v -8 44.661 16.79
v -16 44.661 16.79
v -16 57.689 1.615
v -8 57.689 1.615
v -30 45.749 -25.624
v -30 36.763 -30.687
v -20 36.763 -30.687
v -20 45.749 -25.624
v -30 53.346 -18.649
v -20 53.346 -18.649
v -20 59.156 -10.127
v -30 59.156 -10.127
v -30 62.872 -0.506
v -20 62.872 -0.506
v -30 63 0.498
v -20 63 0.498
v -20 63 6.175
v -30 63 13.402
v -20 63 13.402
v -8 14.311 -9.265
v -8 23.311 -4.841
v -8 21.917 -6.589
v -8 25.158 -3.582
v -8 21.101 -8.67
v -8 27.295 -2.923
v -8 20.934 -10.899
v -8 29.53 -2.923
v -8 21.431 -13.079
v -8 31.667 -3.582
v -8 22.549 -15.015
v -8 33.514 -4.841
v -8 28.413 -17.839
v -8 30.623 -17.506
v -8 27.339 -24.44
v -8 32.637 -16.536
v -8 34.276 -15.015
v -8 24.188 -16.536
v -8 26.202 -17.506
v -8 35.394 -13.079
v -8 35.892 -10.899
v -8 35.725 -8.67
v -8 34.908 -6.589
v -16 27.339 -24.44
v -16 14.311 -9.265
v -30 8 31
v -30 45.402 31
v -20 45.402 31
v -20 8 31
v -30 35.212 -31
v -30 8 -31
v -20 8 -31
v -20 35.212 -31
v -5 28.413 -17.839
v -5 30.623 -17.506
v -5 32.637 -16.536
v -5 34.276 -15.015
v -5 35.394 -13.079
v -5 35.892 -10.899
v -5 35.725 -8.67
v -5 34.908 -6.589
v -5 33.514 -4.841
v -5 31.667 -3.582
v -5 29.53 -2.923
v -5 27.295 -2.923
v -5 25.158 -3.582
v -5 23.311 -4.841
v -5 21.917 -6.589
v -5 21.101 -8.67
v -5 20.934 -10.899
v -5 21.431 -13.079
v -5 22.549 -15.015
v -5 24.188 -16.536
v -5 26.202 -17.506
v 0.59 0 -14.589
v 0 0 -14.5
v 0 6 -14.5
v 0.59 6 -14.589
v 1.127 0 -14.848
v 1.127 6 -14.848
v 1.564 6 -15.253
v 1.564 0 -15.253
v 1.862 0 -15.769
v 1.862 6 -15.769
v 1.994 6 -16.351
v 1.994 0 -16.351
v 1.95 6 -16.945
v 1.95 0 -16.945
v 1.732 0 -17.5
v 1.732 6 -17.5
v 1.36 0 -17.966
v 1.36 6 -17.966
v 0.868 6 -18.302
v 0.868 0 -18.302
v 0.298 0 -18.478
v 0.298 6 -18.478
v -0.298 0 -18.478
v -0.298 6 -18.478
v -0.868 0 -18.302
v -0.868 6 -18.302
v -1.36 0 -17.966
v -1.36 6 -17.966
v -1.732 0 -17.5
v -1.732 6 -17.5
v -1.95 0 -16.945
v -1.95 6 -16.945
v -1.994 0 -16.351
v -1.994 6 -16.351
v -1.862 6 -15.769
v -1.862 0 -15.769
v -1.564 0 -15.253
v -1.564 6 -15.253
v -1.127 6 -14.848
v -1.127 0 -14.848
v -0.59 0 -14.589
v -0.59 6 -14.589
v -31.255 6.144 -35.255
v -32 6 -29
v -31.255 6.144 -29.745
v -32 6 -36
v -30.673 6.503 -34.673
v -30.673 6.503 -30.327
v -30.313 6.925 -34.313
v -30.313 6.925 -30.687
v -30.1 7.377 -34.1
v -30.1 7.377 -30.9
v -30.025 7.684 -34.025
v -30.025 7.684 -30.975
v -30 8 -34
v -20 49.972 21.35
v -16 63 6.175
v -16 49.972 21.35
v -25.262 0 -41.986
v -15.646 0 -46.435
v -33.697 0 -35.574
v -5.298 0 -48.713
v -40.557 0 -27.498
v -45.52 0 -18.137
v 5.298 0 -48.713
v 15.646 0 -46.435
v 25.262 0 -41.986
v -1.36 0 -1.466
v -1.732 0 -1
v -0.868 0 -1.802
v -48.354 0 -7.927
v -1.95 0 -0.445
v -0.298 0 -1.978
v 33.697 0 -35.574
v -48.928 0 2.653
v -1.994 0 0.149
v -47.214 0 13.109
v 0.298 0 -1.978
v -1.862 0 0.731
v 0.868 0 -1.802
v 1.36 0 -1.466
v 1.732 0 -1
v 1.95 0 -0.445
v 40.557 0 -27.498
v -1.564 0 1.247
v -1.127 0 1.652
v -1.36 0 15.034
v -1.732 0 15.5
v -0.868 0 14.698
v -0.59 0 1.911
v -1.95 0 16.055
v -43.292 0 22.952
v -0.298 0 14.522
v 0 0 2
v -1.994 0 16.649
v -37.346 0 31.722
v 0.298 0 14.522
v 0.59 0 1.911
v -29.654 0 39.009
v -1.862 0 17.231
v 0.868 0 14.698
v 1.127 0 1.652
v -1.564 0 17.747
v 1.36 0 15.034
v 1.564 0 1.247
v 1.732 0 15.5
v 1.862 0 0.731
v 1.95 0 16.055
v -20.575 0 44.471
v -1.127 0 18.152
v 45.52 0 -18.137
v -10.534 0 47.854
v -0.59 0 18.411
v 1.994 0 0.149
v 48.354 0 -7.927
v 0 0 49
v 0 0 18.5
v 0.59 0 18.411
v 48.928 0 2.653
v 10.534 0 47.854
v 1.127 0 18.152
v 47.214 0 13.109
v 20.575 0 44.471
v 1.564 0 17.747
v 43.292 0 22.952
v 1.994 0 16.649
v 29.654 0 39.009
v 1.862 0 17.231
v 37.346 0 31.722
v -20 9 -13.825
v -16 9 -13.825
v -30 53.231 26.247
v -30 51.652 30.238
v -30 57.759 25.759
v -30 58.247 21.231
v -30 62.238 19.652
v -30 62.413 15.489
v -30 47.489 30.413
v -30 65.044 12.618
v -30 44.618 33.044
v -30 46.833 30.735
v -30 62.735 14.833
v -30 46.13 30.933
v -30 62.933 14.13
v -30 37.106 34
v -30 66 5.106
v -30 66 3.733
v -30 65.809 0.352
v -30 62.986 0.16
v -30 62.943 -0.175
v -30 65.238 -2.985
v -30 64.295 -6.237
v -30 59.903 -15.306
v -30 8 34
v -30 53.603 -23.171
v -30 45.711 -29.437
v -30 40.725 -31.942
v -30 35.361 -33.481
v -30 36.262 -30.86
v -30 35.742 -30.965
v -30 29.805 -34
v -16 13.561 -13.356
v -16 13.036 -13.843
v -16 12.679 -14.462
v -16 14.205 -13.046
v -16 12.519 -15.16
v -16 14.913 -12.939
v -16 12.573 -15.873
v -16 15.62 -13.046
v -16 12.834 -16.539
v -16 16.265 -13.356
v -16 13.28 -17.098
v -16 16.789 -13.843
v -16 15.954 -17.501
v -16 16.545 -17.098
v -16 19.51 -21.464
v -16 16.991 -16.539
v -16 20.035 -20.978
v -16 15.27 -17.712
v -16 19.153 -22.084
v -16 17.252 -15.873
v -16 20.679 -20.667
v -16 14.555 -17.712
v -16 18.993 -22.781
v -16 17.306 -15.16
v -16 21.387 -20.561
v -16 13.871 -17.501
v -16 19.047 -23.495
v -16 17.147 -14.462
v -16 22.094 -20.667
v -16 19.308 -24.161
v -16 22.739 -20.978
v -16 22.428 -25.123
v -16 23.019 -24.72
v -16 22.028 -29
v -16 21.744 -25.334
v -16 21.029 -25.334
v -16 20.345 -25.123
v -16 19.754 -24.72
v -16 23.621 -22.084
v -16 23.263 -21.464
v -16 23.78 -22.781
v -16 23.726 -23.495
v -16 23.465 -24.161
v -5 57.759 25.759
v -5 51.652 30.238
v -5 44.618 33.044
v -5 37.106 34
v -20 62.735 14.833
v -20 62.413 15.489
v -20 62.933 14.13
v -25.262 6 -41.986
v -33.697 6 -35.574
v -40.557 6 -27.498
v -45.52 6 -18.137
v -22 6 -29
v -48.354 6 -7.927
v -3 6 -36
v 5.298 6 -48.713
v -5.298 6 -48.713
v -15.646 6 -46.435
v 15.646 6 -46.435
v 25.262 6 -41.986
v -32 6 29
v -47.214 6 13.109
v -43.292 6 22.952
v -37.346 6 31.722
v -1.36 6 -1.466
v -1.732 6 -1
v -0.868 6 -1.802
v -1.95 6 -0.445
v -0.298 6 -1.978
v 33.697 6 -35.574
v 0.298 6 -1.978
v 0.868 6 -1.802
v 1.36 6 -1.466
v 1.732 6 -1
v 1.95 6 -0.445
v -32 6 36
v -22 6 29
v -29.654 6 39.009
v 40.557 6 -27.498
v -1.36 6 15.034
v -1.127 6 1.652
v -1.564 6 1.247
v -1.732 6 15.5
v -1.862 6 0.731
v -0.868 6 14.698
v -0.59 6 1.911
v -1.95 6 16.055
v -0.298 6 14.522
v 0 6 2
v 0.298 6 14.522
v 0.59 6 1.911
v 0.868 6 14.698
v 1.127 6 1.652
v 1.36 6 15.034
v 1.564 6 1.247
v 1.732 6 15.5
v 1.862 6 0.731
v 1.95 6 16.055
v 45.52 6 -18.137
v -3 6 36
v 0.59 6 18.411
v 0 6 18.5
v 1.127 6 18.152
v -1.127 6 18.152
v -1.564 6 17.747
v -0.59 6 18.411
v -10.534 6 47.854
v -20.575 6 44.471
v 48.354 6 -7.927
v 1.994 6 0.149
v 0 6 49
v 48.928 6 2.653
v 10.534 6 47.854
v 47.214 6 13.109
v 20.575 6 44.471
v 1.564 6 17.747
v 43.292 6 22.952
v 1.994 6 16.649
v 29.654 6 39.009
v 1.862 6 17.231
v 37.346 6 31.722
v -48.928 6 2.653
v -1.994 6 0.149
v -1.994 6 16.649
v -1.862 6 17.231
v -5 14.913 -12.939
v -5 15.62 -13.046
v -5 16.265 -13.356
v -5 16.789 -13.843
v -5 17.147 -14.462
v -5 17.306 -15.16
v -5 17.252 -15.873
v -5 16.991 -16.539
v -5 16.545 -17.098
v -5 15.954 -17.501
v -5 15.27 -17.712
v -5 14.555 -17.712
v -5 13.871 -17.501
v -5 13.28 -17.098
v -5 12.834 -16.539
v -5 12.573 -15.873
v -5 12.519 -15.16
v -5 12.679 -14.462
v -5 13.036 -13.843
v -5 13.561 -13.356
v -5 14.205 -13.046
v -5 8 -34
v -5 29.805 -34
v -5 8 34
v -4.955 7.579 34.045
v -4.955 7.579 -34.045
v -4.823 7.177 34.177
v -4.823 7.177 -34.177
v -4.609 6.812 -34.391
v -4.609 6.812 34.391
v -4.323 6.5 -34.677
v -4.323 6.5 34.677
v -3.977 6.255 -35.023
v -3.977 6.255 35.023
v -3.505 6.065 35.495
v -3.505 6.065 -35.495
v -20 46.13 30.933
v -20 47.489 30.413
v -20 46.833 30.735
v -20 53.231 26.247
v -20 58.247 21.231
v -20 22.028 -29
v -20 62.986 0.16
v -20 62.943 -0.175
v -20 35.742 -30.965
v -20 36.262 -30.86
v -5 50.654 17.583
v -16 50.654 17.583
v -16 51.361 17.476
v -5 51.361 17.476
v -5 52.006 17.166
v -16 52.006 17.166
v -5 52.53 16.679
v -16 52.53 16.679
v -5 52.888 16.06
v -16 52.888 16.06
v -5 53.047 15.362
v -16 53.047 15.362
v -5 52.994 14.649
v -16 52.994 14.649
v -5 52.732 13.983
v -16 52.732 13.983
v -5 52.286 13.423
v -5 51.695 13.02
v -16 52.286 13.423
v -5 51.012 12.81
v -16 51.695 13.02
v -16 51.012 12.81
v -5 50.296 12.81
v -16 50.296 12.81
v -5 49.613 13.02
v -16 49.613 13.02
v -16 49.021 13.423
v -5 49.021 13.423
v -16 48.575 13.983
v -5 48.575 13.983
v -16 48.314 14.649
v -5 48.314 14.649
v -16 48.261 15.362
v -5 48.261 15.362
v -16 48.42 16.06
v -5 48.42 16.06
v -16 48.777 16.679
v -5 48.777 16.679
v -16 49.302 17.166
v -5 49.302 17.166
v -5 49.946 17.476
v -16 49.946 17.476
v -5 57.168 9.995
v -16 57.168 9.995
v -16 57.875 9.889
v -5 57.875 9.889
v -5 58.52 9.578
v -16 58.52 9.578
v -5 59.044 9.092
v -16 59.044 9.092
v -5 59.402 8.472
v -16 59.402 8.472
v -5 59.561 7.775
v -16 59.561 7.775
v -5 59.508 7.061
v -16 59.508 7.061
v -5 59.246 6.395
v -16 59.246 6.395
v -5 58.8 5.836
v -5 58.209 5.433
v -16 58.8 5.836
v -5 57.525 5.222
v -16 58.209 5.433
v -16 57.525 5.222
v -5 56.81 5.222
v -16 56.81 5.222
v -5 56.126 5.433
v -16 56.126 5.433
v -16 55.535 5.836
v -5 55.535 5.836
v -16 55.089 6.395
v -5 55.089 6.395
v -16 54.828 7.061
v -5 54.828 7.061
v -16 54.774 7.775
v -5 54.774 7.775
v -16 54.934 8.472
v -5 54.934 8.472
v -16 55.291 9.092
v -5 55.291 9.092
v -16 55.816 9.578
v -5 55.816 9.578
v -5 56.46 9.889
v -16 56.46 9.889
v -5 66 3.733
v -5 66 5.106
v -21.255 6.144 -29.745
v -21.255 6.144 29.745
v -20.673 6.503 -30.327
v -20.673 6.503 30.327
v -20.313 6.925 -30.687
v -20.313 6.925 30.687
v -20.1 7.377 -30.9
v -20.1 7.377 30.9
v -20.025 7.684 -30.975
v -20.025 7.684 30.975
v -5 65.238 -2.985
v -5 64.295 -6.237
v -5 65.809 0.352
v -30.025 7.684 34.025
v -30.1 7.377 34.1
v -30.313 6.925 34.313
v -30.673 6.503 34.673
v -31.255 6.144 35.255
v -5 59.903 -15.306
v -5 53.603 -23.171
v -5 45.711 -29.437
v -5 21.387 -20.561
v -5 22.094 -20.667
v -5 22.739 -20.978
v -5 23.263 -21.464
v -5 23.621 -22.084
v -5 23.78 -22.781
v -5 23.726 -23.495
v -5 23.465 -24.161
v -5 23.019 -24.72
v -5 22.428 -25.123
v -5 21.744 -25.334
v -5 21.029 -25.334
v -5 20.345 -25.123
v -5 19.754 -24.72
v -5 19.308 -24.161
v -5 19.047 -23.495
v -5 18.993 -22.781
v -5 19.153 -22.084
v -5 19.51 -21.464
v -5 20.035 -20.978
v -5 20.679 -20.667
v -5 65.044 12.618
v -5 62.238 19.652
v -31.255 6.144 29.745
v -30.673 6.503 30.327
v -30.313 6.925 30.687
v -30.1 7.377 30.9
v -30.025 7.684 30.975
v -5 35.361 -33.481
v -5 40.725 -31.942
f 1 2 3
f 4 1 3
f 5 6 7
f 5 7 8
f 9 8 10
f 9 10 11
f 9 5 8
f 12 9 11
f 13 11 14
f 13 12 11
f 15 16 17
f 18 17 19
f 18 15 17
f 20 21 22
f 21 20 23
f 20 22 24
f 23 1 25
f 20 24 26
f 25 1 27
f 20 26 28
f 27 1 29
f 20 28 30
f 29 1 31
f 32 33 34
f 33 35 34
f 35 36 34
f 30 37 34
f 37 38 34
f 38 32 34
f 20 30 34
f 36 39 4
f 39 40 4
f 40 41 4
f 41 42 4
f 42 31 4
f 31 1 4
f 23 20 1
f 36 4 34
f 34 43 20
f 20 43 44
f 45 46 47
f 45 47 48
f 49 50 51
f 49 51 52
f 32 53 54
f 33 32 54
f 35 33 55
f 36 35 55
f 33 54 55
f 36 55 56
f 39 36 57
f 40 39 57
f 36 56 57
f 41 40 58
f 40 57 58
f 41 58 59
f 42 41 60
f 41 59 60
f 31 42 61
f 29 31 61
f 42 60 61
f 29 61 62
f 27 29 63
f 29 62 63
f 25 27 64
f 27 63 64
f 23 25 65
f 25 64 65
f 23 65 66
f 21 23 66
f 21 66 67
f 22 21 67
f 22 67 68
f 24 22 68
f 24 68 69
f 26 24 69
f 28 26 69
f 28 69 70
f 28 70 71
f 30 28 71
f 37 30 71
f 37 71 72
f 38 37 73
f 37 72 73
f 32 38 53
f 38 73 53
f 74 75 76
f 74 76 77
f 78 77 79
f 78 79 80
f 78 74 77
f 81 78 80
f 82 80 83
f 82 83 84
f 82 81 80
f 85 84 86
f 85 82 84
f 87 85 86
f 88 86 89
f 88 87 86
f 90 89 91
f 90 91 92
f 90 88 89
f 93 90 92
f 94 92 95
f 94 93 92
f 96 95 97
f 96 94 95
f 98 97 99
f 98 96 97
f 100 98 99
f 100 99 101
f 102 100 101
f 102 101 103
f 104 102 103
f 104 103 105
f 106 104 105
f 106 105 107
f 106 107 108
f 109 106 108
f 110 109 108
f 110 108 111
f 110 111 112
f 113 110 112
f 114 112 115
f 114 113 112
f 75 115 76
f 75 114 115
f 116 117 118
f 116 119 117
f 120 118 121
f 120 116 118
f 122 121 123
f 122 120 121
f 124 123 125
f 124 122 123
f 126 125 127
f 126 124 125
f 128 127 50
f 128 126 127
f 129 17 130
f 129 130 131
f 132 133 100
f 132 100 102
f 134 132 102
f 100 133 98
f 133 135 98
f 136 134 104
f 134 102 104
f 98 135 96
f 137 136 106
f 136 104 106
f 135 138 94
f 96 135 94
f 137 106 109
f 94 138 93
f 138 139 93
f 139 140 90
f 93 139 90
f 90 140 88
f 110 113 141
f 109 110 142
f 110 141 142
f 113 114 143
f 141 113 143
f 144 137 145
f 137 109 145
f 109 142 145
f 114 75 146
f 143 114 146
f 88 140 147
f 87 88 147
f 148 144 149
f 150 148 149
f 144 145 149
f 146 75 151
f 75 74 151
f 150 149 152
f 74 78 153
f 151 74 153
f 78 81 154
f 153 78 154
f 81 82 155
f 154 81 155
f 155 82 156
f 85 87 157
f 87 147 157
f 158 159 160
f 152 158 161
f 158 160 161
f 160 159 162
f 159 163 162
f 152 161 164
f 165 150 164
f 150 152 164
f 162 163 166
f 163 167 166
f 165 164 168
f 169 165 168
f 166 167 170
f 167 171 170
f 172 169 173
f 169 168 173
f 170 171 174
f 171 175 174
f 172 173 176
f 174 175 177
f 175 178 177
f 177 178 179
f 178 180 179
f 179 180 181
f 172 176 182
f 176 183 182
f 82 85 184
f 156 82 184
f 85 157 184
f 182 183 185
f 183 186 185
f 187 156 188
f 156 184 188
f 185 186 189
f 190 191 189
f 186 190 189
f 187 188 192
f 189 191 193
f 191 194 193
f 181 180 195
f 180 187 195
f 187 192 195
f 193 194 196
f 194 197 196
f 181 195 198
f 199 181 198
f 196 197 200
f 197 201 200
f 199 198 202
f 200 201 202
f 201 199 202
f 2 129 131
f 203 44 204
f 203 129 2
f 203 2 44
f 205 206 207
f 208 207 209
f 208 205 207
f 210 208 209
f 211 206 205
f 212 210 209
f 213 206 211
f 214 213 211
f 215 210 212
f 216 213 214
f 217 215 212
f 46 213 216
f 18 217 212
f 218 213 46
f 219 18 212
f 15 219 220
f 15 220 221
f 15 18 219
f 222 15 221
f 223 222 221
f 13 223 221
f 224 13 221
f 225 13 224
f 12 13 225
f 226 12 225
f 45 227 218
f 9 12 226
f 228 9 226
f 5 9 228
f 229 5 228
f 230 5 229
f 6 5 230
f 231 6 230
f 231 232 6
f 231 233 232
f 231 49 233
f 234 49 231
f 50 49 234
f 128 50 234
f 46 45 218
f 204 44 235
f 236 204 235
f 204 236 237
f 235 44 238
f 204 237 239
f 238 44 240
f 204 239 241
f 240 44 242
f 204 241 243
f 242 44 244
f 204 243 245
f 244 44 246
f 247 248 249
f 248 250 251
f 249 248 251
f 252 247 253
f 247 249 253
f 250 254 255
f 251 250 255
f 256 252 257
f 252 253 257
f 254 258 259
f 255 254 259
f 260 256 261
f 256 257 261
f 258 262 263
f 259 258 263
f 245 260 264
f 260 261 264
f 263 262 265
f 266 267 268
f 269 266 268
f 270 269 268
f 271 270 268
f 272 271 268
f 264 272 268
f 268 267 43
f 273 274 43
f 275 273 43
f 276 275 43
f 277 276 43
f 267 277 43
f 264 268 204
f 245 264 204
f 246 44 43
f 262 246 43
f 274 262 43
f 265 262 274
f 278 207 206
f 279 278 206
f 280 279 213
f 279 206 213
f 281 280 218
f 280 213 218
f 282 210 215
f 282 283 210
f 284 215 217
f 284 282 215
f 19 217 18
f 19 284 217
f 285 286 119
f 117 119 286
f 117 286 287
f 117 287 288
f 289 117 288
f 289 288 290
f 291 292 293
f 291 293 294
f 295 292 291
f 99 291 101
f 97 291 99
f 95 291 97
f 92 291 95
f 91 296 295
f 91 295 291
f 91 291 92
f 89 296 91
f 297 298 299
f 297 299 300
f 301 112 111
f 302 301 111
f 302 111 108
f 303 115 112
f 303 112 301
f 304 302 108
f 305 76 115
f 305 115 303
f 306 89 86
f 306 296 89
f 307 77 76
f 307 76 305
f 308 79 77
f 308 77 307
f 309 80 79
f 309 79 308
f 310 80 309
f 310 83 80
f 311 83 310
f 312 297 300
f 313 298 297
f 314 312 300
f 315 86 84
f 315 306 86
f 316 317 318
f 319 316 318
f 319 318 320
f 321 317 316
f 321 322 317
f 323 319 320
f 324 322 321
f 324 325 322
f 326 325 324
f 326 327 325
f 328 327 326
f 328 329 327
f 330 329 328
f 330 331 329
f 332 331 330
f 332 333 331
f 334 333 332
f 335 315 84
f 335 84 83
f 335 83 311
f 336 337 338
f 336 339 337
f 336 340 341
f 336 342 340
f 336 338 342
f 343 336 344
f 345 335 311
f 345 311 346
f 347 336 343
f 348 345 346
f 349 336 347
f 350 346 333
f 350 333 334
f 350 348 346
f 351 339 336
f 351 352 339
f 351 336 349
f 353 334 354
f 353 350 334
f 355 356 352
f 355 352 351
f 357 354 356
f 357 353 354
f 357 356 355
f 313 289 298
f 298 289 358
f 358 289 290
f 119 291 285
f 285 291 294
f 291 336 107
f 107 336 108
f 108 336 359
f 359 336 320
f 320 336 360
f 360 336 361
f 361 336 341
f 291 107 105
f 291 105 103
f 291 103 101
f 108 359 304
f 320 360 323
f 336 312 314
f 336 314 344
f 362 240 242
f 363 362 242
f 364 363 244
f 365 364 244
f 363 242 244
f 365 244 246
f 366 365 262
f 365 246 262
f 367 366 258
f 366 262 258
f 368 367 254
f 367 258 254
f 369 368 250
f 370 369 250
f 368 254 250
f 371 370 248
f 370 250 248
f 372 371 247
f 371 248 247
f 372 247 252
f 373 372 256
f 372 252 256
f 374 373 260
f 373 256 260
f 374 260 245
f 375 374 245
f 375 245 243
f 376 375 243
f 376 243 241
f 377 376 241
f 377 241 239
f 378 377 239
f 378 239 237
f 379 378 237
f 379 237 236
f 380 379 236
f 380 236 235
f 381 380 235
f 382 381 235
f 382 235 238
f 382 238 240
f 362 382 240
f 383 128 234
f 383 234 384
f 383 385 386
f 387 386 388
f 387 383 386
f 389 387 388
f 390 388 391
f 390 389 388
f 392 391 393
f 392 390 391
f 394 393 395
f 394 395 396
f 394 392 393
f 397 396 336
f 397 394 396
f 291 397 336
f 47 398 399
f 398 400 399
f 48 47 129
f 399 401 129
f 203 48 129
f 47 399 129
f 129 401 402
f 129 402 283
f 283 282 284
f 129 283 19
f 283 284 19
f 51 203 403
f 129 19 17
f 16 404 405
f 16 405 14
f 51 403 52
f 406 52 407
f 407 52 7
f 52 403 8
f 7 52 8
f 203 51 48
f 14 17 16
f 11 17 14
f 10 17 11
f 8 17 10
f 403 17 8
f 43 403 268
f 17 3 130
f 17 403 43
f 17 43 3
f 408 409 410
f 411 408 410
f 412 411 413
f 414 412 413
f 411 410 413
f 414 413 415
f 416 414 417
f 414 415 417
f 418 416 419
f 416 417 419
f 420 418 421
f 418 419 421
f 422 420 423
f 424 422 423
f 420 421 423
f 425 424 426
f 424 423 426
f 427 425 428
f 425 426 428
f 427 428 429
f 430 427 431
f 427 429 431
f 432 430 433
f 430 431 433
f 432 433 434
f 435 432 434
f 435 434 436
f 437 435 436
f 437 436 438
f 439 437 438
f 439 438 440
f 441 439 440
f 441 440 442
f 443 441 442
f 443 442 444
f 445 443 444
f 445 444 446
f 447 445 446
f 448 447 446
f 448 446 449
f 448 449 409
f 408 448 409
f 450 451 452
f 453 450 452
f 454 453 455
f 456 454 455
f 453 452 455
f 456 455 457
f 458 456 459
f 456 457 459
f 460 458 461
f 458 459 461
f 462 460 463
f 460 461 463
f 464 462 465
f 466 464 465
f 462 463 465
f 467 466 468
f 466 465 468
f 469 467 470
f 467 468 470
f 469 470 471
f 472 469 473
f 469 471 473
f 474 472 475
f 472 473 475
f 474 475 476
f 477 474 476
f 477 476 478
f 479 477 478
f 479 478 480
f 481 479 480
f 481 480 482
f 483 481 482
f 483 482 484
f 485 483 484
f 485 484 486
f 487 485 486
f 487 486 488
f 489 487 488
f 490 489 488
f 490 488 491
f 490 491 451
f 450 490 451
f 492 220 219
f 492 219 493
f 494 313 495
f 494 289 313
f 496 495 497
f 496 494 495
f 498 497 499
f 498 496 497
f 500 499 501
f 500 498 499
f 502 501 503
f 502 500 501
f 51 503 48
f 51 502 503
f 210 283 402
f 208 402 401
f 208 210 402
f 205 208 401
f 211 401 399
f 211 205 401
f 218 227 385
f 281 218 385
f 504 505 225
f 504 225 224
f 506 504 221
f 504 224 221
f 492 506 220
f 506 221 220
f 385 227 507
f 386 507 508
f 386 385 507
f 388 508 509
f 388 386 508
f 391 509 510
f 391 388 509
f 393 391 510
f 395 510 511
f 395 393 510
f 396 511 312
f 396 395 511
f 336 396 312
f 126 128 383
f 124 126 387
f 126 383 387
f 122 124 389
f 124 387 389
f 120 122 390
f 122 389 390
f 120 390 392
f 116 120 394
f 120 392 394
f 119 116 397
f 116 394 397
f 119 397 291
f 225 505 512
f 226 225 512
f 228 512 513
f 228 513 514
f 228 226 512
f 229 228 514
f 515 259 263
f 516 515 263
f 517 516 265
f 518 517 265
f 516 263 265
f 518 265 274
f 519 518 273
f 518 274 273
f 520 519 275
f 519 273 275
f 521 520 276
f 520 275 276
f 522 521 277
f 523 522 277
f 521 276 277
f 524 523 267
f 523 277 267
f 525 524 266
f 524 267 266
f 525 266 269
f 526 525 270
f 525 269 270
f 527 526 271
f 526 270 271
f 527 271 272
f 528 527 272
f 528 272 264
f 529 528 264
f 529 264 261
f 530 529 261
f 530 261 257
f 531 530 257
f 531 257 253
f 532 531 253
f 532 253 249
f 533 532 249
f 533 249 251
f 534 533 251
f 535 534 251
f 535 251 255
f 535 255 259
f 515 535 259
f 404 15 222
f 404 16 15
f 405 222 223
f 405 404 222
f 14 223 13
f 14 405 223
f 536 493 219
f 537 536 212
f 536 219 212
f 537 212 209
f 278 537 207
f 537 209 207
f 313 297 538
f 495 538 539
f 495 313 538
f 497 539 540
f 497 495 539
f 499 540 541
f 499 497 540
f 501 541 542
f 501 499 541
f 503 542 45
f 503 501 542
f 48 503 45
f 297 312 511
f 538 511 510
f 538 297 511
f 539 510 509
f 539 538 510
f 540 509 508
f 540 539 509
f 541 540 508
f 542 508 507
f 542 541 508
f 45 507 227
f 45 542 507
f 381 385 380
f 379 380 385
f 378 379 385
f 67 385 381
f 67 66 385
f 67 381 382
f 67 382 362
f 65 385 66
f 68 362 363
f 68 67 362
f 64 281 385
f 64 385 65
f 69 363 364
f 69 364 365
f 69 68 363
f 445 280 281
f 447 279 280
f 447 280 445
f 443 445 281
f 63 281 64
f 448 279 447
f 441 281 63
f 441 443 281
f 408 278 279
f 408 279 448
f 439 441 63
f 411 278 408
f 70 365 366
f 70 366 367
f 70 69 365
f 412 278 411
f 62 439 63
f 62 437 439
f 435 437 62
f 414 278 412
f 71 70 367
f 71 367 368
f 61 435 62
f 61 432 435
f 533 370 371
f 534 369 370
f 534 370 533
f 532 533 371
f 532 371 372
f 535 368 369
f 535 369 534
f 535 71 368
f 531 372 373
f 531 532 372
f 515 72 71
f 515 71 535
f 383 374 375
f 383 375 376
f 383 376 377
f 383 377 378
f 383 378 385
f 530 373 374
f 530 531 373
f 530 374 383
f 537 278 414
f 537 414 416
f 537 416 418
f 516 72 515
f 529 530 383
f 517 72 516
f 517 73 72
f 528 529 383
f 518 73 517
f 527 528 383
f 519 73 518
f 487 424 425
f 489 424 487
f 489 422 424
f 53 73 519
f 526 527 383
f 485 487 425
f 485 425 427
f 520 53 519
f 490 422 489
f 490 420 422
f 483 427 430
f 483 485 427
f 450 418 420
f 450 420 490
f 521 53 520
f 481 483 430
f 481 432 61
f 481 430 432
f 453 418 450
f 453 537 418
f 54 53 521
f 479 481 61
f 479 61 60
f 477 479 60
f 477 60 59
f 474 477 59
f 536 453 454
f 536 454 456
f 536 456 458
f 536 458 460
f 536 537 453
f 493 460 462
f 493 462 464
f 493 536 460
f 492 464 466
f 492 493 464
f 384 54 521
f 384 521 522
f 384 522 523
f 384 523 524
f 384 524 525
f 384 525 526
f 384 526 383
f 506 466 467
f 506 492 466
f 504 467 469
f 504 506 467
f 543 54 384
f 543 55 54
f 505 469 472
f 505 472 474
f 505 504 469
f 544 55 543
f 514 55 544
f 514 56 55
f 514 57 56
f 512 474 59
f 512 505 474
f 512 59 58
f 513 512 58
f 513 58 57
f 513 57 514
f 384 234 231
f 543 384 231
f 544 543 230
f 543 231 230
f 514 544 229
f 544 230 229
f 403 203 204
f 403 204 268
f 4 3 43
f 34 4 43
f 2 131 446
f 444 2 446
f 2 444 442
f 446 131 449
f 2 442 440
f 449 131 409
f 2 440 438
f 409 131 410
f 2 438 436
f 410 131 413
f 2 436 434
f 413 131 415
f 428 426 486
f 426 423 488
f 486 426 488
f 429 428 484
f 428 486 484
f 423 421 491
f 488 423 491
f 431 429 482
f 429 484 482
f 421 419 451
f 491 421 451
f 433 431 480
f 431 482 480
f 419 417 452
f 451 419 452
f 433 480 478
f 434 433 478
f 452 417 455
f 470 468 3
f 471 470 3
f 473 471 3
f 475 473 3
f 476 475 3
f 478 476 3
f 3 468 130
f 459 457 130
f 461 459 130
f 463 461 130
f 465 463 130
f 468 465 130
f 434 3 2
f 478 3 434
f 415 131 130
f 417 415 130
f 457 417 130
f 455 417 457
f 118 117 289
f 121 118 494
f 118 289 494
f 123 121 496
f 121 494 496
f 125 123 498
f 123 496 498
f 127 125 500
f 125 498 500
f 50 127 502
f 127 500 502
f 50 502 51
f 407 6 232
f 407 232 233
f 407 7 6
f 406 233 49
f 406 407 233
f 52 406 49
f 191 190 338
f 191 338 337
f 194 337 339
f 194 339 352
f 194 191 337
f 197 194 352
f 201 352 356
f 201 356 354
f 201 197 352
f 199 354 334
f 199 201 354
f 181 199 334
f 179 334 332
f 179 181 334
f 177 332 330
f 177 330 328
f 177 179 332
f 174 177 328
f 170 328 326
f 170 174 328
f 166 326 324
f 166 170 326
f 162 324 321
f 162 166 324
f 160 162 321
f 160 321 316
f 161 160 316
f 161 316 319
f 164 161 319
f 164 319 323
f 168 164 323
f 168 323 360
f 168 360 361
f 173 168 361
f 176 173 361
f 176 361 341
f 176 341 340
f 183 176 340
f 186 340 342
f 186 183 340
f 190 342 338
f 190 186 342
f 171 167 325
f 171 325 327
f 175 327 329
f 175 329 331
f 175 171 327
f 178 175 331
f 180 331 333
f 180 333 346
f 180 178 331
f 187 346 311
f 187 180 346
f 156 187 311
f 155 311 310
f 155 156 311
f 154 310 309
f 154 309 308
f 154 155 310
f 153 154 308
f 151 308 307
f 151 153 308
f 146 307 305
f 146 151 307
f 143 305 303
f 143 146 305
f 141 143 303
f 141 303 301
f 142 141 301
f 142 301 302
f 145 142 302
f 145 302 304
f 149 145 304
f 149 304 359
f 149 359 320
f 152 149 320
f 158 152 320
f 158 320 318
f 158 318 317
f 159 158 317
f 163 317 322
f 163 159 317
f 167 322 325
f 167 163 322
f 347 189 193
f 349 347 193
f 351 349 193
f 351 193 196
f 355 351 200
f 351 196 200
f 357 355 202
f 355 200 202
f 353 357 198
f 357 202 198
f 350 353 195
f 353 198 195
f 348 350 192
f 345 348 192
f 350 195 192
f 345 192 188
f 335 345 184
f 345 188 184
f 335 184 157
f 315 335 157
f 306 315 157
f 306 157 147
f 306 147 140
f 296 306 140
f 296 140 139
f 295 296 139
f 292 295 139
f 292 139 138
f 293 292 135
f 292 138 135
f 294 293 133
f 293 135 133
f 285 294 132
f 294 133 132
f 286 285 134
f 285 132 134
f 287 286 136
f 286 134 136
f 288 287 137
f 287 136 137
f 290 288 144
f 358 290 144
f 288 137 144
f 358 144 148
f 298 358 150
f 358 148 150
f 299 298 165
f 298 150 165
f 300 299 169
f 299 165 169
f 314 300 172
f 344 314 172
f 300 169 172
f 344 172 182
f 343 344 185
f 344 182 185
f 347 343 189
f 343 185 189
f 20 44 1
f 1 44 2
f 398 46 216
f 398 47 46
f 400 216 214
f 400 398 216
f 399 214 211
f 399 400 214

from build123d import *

# Parameters (mm, degrees)
SKETCH1_R           = 49
SKETCH1_R_2         = 2
BOSS_EXTRUDE1_DEPTH = 6
SKETCH3_W           = 25
SKETCH3_H           = 68
BOSS_EXTRUDE2_DEPTH = 60
CUT_EXTRUDE1_DEPTH  = 14
SKETCH5_R           = 2.4
CUT_EXTRUDE2_DEPTH  = 20
CUT_EXTRUDE3_DEPTH  = 30
CUT_EXTRUDE5_DEPTH  = 10
SKETCH13_R          = 7.5
BOSS_EXTRUDE3_DEPTH = 3
FILLET2_R           = 30
FILLET3_R           = 2
FILLET4_R           = 4


with BuildPart() as part:
    # Sketch1 → Boss-Extrude1 (new body)
    with BuildSketch(Plane(origin=(0, 0, 0), x_dir=(1, 0, 0), z_dir=(0, 1, 0))):
        with Locations(Location((0, 0, 0), (0, 0, 270))):
            Circle(SKETCH1_R)
        with Locations(Location((0, 16.5, 0), (0, 0, 270))):
            Circle(SKETCH1_R_2, mode=Mode.SUBTRACT)
        with Locations(Location((0, -16.5, 0), (0, 0, 270))):
            Circle(SKETCH1_R_2, mode=Mode.SUBTRACT)
        with Locations(Location((0, 0, 0), (0, 0, 270))):
            Circle(SKETCH1_R_2, mode=Mode.SUBTRACT)
    extrude(amount=BOSS_EXTRUDE1_DEPTH)

    # Sketch3 → Boss-Extrude2 (add)
    with BuildSketch(Plane(origin=(0, 6, 0), x_dir=(1, 0, 0), z_dir=(0, 1, 0))):
        with Locations((-17.5, 0)):
            Rectangle(SKETCH3_W, SKETCH3_H)
    extrude(amount=BOSS_EXTRUDE2_DEPTH)

    # Sketch4 → Cut-Extrude1 (cut)
    with BuildSketch(Plane.ZY.offset(30)):
        Polygon((-13.82509047, 9), (-29, 22.02774427), (6.17490953, 63), (21.349819059, 49.97225573), align=None)
    extrude(amount=-CUT_EXTRUDE1_DEPTH, mode=Mode.SUBTRACT)

    # Sketch5 → Cut-Extrude2 (cut)
    with BuildSketch(Plane.ZY.offset(16)):
        with Locations((-22.960549625, 21.386659614)):
            Circle(SKETCH5_R)
        with Locations((-15.33906677, 14.912634661)):
            Circle(SKETCH5_R)
        with Locations((7.595246131, 57.167755541)):
            Circle(SKETCH5_R)
        with Locations((15.182700896, 50.653883406)):
            Circle(SKETCH5_R)
        Polygon((-24.440289505, 27.338962606), (-9.265379976, 14.311218335), (16.790108565, 44.661037394), (1.615199035, 57.688781665), align=None)
    extrude(amount=-CUT_EXTRUDE2_DEPTH, mode=Mode.SUBTRACT)

    # Sketch8 → Cut-Extrude3 (cut)
    with BuildSketch(Plane.ZY.offset(30)):
        with BuildLine():
            Line((-34, 36), (-34, 66))
            Line((-34, 66), (0, 66))
            ThreePointArc((0, 66), (-21.05469299, 55.595318722), (-34, 36))
        make_face()
        with BuildLine():
            Line((14.5, 66), (34, 66))
            Line((34, 66), (34, 46.5))
            ThreePointArc((34, 46.5), (25.780574394, 57.780574394), (14.5, 66))
        make_face()
    extrude(amount=-CUT_EXTRUDE3_DEPTH, mode=Mode.SUBTRACT)

    # Sketch12 → Cut-Extrude5 (cut)
    with BuildSketch(Plane.ZY.offset(30)):
        with BuildLine():
            Line((-31, 6), (-31, 36))
            ThreePointArc((-31, 36), (-18.763387337, 53.246852127), (0, 63))
            Line((0, 63), (14.5, 63))
            ThreePointArc((14.5, 63), (23.838103281, 55.838103281), (31, 46.5))
            Line((31, 46.5), (31, 6))
            Line((31, 6), (-31, 6))
        make_face()
    extrude(amount=-CUT_EXTRUDE5_DEPTH, mode=Mode.SUBTRACT)

    # Sketch13 → Boss-Extrude3 (add)
    with BuildSketch(Plane(origin=(-5, 0, 0), x_dir=(0, 0, -1), z_dir=(1, 0, 0))):
        Polygon((-1.615199035, 57.688781665), (-16.790108565, 44.661037394), (9.265379976, 14.311218335), (24.440289505, 27.338962606), align=None)
        with Locations((10.338962606, 28.412545235)):
            Circle(SKETCH13_R, mode=Mode.SUBTRACT)
    extrude(amount=-BOSS_EXTRUDE3_DEPTH)

    # Fillet2
    # the kernel refuses this fillet: 30 mm, written as the material it takes off along each edge
    with BuildSketch(Plane(origin=(-70.677664467, 46.5, 34), x_dir=(0, -1, 0), z_dir=(1, 0, 0))) as fillet2_piece_1:
        with BuildLine():
            CenterArc((9.394104212, 30), FILLET2_R, 222.011677285, 47.988322715)
            ThreePointArc((-12.896148883, 9.921538481), (-6.900227571, 4.373054534), (0, 0))
            Line((0, 0), (9.394104212, 0))
        make_face()
    extrude(amount=106.355328934, mode=Mode.SUBTRACT)
    with BuildSketch(Plane(origin=(-70.677664467, 66, 14.5), x_dir=(0, -0.6097657406745188, 0.7925816938963802), z_dir=(1, 0, 0))) as fillet2_piece_2:
        with BuildLine():
            CenterArc((10.847377191, 29.50565373), FILLET2_R, 232.427433582, 47.988322715)
            Line((-7.445595029, 5.728202913), (0, 0))
            ThreePointArc((0, 0), (8.135532893, -0.741519405), (16.271065787, 0))
        make_face()
    extrude(amount=106.355328934, mode=Mode.SUBTRACT)
    with BuildSketch(Plane(origin=(-46.165023977, 66, 0), x_dir=(0, 0, 1), z_dir=(1, 0, 0))) as fillet2_piece_3:
        with BuildLine():
            CenterArc((3.733152378, 30), FILLET2_R, 250.589019729, 19.410980271)
            ThreePointArc((-6.237104224, 1.705230461), (-3.149219616, 0.740444809), (0, 0))
            Line((0, 0), (3.733152378, 0))
        make_face()
    extrude(amount=57.330047955, mode=Mode.SUBTRACT)
    with BuildSketch(Plane(origin=(-56.823799316, 36, -34), x_dir=(0, -1, 0), z_dir=(1, 0, 0))) as fillet2_piece_4:
        with BuildLine():
            CenterArc((6.194691102, -30), FILLET2_R, 90, 32.01758898)
            ThreePointArc((-9.710696233, -4.563438642), (-4.991844582, -1.99126385), (0, 0))
            Line((0, 0), (6.194691102, 0))
        make_face()
    extrude(amount=78.647598632, mode=Mode.SUBTRACT)

    # Fillet3
    fillet3_edges = [part.edges().sort_by_distance(p)[0] for p in [
        (-30, 6, 32.5),
        (-20, 6, 0),
        (-25, 6, 31),
        (-25, 6, -31),
        (-30, 6, -32.5),
        (-17.5, 6, 34),
        (-5, 6, 0),
        (-17.5, 6, -34),
    ]]
    fillet(fillet3_edges, radius=FILLET3_R)

    # Fillet4
    fillet4_edges = [part.edges().sort_by_distance(p)[0] for p in [
        (-25, 36, -31),
        (-25, 63, 0),
        (-25, 63, 14.5),
        (-25, 46.5, 31),
    ]]
    fillet(fillet4_edges, radius=FILLET4_R)


solid = part.part
